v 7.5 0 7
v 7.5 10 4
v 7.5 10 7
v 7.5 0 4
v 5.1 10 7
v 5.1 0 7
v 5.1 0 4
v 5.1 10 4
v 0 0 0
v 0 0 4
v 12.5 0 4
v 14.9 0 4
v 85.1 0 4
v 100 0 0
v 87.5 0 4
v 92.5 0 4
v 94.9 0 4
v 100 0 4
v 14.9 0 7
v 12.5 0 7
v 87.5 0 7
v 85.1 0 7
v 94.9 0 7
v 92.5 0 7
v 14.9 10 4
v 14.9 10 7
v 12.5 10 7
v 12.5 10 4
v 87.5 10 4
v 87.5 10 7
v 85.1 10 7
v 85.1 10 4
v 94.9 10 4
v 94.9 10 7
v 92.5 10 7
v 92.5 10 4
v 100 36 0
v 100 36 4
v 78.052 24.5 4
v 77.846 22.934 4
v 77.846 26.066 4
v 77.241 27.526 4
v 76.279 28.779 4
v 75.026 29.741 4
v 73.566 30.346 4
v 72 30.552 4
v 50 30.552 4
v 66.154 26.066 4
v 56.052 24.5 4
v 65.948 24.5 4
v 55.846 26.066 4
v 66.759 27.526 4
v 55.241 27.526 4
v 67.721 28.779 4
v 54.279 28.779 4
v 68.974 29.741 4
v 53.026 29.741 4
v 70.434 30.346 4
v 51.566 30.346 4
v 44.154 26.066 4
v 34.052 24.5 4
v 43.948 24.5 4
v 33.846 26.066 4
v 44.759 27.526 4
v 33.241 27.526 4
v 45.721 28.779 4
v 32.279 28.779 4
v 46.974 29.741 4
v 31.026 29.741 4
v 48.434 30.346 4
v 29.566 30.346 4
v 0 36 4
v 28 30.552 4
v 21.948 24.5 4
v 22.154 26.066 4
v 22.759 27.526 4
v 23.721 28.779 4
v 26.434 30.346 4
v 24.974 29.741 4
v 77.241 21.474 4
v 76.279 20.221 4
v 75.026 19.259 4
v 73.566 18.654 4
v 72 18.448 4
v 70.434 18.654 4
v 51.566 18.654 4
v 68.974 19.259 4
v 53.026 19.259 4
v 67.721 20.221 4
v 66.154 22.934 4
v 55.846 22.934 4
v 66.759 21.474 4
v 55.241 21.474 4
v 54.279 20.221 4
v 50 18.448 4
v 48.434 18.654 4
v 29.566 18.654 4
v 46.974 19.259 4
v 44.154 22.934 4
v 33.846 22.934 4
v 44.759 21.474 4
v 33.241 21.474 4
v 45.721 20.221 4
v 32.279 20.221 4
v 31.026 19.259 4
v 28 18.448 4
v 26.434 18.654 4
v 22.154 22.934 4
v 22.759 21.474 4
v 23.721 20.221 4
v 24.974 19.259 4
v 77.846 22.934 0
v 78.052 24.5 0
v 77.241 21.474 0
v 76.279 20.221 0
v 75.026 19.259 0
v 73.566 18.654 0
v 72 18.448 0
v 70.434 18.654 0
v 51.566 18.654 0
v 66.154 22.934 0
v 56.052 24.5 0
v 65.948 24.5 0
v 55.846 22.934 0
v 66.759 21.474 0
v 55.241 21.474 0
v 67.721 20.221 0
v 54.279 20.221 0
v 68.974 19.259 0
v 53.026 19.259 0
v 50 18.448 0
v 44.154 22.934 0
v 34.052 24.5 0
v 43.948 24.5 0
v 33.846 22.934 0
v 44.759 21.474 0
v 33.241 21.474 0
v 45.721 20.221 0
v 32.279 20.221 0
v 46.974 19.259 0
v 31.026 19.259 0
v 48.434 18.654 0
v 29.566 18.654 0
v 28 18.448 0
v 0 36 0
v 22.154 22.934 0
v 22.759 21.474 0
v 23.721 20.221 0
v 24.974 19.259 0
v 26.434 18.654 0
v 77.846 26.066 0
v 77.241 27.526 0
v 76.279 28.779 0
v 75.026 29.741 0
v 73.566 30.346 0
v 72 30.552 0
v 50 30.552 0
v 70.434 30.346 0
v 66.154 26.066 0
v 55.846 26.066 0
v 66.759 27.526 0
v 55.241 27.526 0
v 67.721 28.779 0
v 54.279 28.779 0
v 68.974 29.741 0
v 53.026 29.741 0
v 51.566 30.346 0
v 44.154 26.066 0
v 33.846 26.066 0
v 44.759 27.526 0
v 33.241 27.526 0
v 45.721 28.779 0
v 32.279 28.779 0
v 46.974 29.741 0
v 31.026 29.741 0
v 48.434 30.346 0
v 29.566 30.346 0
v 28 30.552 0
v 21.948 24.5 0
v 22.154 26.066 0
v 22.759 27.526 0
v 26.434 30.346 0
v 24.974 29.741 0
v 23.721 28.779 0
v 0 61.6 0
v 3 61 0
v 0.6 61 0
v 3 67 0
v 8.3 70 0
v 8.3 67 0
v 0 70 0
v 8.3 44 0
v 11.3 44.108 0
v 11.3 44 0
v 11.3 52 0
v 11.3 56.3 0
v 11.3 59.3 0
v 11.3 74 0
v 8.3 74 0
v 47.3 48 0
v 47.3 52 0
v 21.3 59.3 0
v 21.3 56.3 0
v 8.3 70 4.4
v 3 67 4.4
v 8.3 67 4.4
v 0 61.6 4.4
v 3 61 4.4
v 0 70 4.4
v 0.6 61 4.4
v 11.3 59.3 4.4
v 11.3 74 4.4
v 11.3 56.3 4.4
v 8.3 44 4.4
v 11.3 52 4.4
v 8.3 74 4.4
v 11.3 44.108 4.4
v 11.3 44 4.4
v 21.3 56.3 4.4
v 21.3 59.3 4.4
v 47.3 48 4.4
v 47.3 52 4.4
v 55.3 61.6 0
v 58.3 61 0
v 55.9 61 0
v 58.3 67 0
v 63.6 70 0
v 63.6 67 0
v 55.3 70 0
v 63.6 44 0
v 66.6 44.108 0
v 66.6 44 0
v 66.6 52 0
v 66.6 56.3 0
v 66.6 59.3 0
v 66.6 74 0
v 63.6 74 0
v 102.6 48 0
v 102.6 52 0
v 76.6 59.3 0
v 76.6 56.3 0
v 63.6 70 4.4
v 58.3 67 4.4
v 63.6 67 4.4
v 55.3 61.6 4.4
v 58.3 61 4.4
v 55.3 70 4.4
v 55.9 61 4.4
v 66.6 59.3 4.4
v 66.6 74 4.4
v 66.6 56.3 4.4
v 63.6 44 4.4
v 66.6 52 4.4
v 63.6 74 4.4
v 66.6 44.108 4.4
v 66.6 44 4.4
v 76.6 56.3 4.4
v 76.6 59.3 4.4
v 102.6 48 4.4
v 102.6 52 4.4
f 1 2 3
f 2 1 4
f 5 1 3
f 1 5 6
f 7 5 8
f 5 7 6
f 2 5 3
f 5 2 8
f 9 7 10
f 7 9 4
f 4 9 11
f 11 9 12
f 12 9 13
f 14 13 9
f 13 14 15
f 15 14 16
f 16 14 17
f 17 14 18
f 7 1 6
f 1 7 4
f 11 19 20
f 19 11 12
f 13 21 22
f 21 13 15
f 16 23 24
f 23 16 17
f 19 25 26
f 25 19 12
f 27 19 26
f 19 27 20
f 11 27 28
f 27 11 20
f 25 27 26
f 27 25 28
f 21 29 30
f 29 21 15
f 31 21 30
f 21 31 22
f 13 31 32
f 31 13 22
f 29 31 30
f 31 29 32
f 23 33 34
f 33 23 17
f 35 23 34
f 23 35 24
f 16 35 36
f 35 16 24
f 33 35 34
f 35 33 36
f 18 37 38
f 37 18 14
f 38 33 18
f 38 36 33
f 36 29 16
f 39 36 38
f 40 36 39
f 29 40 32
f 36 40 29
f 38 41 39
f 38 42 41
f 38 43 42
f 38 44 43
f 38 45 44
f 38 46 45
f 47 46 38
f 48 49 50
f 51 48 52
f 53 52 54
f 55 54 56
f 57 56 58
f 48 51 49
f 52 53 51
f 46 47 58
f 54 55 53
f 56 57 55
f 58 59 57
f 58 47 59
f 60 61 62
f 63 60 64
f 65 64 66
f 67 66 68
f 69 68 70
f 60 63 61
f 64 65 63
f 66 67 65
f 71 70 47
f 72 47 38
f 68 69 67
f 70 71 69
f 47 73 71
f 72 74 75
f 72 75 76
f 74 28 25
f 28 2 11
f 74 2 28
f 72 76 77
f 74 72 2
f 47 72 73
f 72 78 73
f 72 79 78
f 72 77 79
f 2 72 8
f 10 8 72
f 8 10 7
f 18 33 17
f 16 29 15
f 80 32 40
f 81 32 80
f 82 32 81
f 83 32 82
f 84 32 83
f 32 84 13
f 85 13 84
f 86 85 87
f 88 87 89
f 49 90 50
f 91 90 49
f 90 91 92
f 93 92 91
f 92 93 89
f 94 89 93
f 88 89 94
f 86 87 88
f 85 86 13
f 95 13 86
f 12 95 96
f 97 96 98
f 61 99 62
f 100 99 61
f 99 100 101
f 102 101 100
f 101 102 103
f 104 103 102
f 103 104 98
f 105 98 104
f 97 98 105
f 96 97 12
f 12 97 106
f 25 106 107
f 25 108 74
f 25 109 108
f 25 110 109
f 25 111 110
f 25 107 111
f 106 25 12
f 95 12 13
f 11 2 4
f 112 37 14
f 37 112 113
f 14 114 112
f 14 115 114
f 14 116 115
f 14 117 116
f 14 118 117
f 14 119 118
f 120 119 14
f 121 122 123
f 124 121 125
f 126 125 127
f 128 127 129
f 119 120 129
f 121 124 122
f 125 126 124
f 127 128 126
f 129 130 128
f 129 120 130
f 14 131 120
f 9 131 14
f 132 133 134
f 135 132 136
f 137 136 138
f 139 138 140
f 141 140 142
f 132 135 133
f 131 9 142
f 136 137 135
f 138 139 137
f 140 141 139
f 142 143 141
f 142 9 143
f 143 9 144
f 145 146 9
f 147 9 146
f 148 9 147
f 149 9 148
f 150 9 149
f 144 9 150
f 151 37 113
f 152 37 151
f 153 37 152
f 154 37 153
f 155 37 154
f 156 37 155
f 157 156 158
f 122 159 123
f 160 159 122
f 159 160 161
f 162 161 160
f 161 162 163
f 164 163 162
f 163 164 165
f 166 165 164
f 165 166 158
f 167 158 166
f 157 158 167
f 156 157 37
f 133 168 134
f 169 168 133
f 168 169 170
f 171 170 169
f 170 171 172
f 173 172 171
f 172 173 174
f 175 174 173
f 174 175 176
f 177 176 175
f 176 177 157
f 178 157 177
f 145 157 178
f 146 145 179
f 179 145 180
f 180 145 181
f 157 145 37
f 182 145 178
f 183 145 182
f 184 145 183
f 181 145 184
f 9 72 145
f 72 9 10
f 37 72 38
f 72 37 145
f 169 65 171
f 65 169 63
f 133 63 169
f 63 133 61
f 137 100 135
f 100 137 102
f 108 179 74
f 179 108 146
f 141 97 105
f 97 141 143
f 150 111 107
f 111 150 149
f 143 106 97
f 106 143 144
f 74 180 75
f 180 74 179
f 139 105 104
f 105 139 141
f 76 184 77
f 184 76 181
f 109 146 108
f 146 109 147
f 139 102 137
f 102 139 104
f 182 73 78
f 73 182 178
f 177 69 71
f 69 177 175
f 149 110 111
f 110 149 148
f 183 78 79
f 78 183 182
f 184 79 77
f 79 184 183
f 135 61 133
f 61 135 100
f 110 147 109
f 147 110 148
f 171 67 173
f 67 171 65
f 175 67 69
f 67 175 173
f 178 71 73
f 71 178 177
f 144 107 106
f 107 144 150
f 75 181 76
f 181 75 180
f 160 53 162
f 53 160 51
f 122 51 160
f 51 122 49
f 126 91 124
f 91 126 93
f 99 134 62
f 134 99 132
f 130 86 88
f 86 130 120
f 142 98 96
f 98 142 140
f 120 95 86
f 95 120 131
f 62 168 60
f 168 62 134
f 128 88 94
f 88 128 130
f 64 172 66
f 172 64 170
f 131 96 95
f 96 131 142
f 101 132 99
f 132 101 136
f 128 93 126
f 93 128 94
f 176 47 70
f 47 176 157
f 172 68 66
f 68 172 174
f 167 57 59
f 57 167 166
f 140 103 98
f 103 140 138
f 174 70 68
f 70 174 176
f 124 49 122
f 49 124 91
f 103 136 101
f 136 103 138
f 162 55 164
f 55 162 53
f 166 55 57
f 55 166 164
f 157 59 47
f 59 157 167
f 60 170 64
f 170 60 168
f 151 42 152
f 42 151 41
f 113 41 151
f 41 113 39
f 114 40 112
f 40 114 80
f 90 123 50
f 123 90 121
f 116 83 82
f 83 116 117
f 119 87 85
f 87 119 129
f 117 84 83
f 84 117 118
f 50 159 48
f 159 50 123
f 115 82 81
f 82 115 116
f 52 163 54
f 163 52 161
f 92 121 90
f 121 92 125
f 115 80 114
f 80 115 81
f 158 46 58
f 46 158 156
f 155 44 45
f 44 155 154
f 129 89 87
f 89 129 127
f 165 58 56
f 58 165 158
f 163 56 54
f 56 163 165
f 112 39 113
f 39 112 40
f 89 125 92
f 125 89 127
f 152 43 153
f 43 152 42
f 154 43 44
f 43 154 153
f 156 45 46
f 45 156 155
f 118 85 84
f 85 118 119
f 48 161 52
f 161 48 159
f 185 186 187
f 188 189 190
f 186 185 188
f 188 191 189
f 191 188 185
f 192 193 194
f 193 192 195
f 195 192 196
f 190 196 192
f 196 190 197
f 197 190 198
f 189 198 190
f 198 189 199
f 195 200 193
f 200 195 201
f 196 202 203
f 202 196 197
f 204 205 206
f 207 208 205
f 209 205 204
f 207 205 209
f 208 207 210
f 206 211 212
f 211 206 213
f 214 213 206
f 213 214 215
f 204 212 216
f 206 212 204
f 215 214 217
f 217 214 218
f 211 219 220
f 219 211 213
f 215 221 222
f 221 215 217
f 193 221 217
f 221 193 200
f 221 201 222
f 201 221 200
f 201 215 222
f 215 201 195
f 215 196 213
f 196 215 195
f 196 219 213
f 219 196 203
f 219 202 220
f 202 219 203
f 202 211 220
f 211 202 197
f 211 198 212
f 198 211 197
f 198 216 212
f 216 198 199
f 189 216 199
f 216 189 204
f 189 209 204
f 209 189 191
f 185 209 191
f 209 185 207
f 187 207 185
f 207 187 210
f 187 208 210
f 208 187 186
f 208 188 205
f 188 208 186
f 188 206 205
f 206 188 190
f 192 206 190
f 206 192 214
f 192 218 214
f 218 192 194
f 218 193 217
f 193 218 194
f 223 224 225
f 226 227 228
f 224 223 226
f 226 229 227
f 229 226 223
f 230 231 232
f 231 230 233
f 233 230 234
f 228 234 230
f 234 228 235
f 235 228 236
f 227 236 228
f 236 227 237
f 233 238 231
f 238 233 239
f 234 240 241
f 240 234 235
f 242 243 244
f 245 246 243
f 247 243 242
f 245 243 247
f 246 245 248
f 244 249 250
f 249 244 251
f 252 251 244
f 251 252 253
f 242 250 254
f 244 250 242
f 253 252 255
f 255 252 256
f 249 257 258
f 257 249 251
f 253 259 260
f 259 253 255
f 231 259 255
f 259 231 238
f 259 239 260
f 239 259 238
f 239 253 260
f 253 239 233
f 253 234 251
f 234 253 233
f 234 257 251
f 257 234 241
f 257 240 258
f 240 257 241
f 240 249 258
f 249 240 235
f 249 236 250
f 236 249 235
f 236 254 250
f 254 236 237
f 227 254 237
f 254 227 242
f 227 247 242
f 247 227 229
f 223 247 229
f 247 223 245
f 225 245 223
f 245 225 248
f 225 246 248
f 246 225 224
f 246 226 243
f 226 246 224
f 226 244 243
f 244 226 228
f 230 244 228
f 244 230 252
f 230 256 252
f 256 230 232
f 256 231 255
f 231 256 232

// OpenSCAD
// SKADIS screwdriver holder: shafts pass through; wider handles rest on top.
// Print all three pieces as laid out: body base down, brackets on broad sides.
// No supports, glue or hardware. Use 4 perimeters; PETG or PLA.
// Mount both brackets in same-height slots: insert teeth, then lower until
// the necks seat. Slide the body's rear apron under the upper fingers,
// between the guide ribs, until its rear edge meets the vertical spines.
// The ledges carry the load; slide the body forward to remove it.
// This is a gravity mount, not a locking latch. Use for light items.
// Dimensions: nominal 5 x 15 mm obround slots, 5 mm board thickness.
// Adjacent columns: 20 mm; alternate columns offset vertically by 20 mm.
// Same-height slots and same-column slots repeat every 40 mm.
// Measurement references (geometry below is original, not copied):
// https://www.reddit.com/r/ikeahacks/comments/rk2qk0/
// https://www.printables.com/model/109009-ikea-skadis-hook-hacek-10mm-100mm
// https://github.com/sebasdv/skadisgen (staggered grid only).
// Print the small hook first to tune fit; physical fit/load not yet tested.

tool_count = 3; // Number of tool bores [2:1:5]
tool_spacing = 22; // Centre spacing between tool bores, mm [20:1:28]
shaft_diameter = 12; // Clear bore diameter; smaller than handle, mm [6:1:16]
depth = 36; // Holder depth including rear assembly apron, mm [32:1:48]
floor_thickness = 4; // Tool-bearing plate thickness, mm [3:0.5:6]
wall = 2.4; // Guide rib thickness, mm [1.6:0.2:3.2]
board_thickness = 5; // Measured board thickness, mm [4.6:0.1:5.4]
tolerance = 0.3; // Clearance per slot side and behind board, mm [0.2:0.05:0.4]
joint_clearance = 0.3; // Sliding joint clearance, mm [0.2:0.05:0.4]
assembled = 0; // View mode: 0 print layout, 1 mounted assembly [0:1:1]

$fn = 24; // Bore facets (diameter below compensates for the polygon flats)
slot_width = 5; // Nominal slot width, mm
clip_width = slot_width-2*tolerance; // Blade thickness across slot, mm
board_gap = board_thickness+tolerance; // Clearance behind front bearing face, mm

mount_span = 40*ceil(((tool_count-1)*tool_spacing+shaft_diameter+12)/40); // Hook spacing, mm
width = mount_span+20; // Holder width including hook margins, mm
bore_y = (13+depth)/2; // Bore row ahead of assembly apron, mm
bore_cut_diameter = shaft_diameter/cos(180/$fn); // Preserve clear diameter across flats, mm
cut_extra = 1; // Through-cutter overlap, mm

// Shared SKADIS profile, in [depth from board, height] coordinates.
// Front bearing face is depth 0; board occupies depth -board_thickness..0.
// A 3 mm neck at height 23..26 passes through the slot; the rear tooth
// reaches height 17, extending 6 mm below the neck to catch behind the board.
// Centre the 9 mm tall tooth in the slot's 10 mm straight middle to insert.
// At default tolerance its 4.4 mm width leaves 0.3 mm on each slot side;
// board_gap leaves another 0.3 mm behind the board before pulling forward.
// Lower until the neck corners bear on the rounded slot bottom (contact is
// intentional). Lift about 8 mm at default fit to centre the tooth for removal.
// Verified against a separate 5 x 15 mm obround-slot board via the dev API;
// Insertion/lowering clear; withdrawal catches. See docs/example-feedback/skadis.md.
module skadis_clip_outline() {
    polygon([[0,0],[3,0],[3,30],[0,30],[0,26],
             [-board_gap-3,26],[-board_gap-3,17.6],
             [-board_gap-2.4,17],[-board_gap,17],
             [-board_gap,23],[0,23]]);
}

module body() {
    difference() {
        union() {
            cube([width,depth,floor_thickness]);
            apron_guides();
        }
        for (i=[0:tool_count-1])
            translate([width/2+(i-(tool_count-1)/2)*tool_spacing,
                       bore_y,-cut_extra])
                cylinder(h=floor_thickness+2*cut_extra,d=bore_cut_diameter);
    }
}

// Flat side plate: lower ledge supports the body; upper finger captures
// its rear apron. All intersections overlap, rather than just touching.
module support_bracket() {
    linear_extrude(clip_width)
        union() {
            skadis_clip_outline();
            polygon([[2,0],[depth+3,4],[depth+3,8],[2,8]]);
            translate([2,8+floor_thickness+joint_clearance])
                square([11,3]);
        }
}

// Guide ribs capture the upper fingers sideways, leaving the front open
// for removal. The body slides toward the board until it meets the spines.
module apron_guides() {
    for (x=[10,width-10])
        for (side=[-1,1])
            translate([x+side*(clip_width/2+joint_clearance+wall/2)-wall/2,
                       0,floor_thickness-0.1])
                cube([wall,10,3.1]);
}

module brackets() {
    if (assembled == 1) {
        for (x=[10,width-10])
            translate([x-clip_width/2,0,0])
                rotate([90,0,90]) support_bracket();
    } else {
        for (i=[0:1])
            translate([board_gap+3+i*(depth+board_gap+14),depth+8,0])
                support_bracket();
    }
}

// Body and brackets print together, each in its own preview colour.
module layout() {
    color("#e4665f") translate(assembled == 1 ? [0,3,8] : [0,0,0]) body();
    color("#d9dde2") brackets();
}

layout();
